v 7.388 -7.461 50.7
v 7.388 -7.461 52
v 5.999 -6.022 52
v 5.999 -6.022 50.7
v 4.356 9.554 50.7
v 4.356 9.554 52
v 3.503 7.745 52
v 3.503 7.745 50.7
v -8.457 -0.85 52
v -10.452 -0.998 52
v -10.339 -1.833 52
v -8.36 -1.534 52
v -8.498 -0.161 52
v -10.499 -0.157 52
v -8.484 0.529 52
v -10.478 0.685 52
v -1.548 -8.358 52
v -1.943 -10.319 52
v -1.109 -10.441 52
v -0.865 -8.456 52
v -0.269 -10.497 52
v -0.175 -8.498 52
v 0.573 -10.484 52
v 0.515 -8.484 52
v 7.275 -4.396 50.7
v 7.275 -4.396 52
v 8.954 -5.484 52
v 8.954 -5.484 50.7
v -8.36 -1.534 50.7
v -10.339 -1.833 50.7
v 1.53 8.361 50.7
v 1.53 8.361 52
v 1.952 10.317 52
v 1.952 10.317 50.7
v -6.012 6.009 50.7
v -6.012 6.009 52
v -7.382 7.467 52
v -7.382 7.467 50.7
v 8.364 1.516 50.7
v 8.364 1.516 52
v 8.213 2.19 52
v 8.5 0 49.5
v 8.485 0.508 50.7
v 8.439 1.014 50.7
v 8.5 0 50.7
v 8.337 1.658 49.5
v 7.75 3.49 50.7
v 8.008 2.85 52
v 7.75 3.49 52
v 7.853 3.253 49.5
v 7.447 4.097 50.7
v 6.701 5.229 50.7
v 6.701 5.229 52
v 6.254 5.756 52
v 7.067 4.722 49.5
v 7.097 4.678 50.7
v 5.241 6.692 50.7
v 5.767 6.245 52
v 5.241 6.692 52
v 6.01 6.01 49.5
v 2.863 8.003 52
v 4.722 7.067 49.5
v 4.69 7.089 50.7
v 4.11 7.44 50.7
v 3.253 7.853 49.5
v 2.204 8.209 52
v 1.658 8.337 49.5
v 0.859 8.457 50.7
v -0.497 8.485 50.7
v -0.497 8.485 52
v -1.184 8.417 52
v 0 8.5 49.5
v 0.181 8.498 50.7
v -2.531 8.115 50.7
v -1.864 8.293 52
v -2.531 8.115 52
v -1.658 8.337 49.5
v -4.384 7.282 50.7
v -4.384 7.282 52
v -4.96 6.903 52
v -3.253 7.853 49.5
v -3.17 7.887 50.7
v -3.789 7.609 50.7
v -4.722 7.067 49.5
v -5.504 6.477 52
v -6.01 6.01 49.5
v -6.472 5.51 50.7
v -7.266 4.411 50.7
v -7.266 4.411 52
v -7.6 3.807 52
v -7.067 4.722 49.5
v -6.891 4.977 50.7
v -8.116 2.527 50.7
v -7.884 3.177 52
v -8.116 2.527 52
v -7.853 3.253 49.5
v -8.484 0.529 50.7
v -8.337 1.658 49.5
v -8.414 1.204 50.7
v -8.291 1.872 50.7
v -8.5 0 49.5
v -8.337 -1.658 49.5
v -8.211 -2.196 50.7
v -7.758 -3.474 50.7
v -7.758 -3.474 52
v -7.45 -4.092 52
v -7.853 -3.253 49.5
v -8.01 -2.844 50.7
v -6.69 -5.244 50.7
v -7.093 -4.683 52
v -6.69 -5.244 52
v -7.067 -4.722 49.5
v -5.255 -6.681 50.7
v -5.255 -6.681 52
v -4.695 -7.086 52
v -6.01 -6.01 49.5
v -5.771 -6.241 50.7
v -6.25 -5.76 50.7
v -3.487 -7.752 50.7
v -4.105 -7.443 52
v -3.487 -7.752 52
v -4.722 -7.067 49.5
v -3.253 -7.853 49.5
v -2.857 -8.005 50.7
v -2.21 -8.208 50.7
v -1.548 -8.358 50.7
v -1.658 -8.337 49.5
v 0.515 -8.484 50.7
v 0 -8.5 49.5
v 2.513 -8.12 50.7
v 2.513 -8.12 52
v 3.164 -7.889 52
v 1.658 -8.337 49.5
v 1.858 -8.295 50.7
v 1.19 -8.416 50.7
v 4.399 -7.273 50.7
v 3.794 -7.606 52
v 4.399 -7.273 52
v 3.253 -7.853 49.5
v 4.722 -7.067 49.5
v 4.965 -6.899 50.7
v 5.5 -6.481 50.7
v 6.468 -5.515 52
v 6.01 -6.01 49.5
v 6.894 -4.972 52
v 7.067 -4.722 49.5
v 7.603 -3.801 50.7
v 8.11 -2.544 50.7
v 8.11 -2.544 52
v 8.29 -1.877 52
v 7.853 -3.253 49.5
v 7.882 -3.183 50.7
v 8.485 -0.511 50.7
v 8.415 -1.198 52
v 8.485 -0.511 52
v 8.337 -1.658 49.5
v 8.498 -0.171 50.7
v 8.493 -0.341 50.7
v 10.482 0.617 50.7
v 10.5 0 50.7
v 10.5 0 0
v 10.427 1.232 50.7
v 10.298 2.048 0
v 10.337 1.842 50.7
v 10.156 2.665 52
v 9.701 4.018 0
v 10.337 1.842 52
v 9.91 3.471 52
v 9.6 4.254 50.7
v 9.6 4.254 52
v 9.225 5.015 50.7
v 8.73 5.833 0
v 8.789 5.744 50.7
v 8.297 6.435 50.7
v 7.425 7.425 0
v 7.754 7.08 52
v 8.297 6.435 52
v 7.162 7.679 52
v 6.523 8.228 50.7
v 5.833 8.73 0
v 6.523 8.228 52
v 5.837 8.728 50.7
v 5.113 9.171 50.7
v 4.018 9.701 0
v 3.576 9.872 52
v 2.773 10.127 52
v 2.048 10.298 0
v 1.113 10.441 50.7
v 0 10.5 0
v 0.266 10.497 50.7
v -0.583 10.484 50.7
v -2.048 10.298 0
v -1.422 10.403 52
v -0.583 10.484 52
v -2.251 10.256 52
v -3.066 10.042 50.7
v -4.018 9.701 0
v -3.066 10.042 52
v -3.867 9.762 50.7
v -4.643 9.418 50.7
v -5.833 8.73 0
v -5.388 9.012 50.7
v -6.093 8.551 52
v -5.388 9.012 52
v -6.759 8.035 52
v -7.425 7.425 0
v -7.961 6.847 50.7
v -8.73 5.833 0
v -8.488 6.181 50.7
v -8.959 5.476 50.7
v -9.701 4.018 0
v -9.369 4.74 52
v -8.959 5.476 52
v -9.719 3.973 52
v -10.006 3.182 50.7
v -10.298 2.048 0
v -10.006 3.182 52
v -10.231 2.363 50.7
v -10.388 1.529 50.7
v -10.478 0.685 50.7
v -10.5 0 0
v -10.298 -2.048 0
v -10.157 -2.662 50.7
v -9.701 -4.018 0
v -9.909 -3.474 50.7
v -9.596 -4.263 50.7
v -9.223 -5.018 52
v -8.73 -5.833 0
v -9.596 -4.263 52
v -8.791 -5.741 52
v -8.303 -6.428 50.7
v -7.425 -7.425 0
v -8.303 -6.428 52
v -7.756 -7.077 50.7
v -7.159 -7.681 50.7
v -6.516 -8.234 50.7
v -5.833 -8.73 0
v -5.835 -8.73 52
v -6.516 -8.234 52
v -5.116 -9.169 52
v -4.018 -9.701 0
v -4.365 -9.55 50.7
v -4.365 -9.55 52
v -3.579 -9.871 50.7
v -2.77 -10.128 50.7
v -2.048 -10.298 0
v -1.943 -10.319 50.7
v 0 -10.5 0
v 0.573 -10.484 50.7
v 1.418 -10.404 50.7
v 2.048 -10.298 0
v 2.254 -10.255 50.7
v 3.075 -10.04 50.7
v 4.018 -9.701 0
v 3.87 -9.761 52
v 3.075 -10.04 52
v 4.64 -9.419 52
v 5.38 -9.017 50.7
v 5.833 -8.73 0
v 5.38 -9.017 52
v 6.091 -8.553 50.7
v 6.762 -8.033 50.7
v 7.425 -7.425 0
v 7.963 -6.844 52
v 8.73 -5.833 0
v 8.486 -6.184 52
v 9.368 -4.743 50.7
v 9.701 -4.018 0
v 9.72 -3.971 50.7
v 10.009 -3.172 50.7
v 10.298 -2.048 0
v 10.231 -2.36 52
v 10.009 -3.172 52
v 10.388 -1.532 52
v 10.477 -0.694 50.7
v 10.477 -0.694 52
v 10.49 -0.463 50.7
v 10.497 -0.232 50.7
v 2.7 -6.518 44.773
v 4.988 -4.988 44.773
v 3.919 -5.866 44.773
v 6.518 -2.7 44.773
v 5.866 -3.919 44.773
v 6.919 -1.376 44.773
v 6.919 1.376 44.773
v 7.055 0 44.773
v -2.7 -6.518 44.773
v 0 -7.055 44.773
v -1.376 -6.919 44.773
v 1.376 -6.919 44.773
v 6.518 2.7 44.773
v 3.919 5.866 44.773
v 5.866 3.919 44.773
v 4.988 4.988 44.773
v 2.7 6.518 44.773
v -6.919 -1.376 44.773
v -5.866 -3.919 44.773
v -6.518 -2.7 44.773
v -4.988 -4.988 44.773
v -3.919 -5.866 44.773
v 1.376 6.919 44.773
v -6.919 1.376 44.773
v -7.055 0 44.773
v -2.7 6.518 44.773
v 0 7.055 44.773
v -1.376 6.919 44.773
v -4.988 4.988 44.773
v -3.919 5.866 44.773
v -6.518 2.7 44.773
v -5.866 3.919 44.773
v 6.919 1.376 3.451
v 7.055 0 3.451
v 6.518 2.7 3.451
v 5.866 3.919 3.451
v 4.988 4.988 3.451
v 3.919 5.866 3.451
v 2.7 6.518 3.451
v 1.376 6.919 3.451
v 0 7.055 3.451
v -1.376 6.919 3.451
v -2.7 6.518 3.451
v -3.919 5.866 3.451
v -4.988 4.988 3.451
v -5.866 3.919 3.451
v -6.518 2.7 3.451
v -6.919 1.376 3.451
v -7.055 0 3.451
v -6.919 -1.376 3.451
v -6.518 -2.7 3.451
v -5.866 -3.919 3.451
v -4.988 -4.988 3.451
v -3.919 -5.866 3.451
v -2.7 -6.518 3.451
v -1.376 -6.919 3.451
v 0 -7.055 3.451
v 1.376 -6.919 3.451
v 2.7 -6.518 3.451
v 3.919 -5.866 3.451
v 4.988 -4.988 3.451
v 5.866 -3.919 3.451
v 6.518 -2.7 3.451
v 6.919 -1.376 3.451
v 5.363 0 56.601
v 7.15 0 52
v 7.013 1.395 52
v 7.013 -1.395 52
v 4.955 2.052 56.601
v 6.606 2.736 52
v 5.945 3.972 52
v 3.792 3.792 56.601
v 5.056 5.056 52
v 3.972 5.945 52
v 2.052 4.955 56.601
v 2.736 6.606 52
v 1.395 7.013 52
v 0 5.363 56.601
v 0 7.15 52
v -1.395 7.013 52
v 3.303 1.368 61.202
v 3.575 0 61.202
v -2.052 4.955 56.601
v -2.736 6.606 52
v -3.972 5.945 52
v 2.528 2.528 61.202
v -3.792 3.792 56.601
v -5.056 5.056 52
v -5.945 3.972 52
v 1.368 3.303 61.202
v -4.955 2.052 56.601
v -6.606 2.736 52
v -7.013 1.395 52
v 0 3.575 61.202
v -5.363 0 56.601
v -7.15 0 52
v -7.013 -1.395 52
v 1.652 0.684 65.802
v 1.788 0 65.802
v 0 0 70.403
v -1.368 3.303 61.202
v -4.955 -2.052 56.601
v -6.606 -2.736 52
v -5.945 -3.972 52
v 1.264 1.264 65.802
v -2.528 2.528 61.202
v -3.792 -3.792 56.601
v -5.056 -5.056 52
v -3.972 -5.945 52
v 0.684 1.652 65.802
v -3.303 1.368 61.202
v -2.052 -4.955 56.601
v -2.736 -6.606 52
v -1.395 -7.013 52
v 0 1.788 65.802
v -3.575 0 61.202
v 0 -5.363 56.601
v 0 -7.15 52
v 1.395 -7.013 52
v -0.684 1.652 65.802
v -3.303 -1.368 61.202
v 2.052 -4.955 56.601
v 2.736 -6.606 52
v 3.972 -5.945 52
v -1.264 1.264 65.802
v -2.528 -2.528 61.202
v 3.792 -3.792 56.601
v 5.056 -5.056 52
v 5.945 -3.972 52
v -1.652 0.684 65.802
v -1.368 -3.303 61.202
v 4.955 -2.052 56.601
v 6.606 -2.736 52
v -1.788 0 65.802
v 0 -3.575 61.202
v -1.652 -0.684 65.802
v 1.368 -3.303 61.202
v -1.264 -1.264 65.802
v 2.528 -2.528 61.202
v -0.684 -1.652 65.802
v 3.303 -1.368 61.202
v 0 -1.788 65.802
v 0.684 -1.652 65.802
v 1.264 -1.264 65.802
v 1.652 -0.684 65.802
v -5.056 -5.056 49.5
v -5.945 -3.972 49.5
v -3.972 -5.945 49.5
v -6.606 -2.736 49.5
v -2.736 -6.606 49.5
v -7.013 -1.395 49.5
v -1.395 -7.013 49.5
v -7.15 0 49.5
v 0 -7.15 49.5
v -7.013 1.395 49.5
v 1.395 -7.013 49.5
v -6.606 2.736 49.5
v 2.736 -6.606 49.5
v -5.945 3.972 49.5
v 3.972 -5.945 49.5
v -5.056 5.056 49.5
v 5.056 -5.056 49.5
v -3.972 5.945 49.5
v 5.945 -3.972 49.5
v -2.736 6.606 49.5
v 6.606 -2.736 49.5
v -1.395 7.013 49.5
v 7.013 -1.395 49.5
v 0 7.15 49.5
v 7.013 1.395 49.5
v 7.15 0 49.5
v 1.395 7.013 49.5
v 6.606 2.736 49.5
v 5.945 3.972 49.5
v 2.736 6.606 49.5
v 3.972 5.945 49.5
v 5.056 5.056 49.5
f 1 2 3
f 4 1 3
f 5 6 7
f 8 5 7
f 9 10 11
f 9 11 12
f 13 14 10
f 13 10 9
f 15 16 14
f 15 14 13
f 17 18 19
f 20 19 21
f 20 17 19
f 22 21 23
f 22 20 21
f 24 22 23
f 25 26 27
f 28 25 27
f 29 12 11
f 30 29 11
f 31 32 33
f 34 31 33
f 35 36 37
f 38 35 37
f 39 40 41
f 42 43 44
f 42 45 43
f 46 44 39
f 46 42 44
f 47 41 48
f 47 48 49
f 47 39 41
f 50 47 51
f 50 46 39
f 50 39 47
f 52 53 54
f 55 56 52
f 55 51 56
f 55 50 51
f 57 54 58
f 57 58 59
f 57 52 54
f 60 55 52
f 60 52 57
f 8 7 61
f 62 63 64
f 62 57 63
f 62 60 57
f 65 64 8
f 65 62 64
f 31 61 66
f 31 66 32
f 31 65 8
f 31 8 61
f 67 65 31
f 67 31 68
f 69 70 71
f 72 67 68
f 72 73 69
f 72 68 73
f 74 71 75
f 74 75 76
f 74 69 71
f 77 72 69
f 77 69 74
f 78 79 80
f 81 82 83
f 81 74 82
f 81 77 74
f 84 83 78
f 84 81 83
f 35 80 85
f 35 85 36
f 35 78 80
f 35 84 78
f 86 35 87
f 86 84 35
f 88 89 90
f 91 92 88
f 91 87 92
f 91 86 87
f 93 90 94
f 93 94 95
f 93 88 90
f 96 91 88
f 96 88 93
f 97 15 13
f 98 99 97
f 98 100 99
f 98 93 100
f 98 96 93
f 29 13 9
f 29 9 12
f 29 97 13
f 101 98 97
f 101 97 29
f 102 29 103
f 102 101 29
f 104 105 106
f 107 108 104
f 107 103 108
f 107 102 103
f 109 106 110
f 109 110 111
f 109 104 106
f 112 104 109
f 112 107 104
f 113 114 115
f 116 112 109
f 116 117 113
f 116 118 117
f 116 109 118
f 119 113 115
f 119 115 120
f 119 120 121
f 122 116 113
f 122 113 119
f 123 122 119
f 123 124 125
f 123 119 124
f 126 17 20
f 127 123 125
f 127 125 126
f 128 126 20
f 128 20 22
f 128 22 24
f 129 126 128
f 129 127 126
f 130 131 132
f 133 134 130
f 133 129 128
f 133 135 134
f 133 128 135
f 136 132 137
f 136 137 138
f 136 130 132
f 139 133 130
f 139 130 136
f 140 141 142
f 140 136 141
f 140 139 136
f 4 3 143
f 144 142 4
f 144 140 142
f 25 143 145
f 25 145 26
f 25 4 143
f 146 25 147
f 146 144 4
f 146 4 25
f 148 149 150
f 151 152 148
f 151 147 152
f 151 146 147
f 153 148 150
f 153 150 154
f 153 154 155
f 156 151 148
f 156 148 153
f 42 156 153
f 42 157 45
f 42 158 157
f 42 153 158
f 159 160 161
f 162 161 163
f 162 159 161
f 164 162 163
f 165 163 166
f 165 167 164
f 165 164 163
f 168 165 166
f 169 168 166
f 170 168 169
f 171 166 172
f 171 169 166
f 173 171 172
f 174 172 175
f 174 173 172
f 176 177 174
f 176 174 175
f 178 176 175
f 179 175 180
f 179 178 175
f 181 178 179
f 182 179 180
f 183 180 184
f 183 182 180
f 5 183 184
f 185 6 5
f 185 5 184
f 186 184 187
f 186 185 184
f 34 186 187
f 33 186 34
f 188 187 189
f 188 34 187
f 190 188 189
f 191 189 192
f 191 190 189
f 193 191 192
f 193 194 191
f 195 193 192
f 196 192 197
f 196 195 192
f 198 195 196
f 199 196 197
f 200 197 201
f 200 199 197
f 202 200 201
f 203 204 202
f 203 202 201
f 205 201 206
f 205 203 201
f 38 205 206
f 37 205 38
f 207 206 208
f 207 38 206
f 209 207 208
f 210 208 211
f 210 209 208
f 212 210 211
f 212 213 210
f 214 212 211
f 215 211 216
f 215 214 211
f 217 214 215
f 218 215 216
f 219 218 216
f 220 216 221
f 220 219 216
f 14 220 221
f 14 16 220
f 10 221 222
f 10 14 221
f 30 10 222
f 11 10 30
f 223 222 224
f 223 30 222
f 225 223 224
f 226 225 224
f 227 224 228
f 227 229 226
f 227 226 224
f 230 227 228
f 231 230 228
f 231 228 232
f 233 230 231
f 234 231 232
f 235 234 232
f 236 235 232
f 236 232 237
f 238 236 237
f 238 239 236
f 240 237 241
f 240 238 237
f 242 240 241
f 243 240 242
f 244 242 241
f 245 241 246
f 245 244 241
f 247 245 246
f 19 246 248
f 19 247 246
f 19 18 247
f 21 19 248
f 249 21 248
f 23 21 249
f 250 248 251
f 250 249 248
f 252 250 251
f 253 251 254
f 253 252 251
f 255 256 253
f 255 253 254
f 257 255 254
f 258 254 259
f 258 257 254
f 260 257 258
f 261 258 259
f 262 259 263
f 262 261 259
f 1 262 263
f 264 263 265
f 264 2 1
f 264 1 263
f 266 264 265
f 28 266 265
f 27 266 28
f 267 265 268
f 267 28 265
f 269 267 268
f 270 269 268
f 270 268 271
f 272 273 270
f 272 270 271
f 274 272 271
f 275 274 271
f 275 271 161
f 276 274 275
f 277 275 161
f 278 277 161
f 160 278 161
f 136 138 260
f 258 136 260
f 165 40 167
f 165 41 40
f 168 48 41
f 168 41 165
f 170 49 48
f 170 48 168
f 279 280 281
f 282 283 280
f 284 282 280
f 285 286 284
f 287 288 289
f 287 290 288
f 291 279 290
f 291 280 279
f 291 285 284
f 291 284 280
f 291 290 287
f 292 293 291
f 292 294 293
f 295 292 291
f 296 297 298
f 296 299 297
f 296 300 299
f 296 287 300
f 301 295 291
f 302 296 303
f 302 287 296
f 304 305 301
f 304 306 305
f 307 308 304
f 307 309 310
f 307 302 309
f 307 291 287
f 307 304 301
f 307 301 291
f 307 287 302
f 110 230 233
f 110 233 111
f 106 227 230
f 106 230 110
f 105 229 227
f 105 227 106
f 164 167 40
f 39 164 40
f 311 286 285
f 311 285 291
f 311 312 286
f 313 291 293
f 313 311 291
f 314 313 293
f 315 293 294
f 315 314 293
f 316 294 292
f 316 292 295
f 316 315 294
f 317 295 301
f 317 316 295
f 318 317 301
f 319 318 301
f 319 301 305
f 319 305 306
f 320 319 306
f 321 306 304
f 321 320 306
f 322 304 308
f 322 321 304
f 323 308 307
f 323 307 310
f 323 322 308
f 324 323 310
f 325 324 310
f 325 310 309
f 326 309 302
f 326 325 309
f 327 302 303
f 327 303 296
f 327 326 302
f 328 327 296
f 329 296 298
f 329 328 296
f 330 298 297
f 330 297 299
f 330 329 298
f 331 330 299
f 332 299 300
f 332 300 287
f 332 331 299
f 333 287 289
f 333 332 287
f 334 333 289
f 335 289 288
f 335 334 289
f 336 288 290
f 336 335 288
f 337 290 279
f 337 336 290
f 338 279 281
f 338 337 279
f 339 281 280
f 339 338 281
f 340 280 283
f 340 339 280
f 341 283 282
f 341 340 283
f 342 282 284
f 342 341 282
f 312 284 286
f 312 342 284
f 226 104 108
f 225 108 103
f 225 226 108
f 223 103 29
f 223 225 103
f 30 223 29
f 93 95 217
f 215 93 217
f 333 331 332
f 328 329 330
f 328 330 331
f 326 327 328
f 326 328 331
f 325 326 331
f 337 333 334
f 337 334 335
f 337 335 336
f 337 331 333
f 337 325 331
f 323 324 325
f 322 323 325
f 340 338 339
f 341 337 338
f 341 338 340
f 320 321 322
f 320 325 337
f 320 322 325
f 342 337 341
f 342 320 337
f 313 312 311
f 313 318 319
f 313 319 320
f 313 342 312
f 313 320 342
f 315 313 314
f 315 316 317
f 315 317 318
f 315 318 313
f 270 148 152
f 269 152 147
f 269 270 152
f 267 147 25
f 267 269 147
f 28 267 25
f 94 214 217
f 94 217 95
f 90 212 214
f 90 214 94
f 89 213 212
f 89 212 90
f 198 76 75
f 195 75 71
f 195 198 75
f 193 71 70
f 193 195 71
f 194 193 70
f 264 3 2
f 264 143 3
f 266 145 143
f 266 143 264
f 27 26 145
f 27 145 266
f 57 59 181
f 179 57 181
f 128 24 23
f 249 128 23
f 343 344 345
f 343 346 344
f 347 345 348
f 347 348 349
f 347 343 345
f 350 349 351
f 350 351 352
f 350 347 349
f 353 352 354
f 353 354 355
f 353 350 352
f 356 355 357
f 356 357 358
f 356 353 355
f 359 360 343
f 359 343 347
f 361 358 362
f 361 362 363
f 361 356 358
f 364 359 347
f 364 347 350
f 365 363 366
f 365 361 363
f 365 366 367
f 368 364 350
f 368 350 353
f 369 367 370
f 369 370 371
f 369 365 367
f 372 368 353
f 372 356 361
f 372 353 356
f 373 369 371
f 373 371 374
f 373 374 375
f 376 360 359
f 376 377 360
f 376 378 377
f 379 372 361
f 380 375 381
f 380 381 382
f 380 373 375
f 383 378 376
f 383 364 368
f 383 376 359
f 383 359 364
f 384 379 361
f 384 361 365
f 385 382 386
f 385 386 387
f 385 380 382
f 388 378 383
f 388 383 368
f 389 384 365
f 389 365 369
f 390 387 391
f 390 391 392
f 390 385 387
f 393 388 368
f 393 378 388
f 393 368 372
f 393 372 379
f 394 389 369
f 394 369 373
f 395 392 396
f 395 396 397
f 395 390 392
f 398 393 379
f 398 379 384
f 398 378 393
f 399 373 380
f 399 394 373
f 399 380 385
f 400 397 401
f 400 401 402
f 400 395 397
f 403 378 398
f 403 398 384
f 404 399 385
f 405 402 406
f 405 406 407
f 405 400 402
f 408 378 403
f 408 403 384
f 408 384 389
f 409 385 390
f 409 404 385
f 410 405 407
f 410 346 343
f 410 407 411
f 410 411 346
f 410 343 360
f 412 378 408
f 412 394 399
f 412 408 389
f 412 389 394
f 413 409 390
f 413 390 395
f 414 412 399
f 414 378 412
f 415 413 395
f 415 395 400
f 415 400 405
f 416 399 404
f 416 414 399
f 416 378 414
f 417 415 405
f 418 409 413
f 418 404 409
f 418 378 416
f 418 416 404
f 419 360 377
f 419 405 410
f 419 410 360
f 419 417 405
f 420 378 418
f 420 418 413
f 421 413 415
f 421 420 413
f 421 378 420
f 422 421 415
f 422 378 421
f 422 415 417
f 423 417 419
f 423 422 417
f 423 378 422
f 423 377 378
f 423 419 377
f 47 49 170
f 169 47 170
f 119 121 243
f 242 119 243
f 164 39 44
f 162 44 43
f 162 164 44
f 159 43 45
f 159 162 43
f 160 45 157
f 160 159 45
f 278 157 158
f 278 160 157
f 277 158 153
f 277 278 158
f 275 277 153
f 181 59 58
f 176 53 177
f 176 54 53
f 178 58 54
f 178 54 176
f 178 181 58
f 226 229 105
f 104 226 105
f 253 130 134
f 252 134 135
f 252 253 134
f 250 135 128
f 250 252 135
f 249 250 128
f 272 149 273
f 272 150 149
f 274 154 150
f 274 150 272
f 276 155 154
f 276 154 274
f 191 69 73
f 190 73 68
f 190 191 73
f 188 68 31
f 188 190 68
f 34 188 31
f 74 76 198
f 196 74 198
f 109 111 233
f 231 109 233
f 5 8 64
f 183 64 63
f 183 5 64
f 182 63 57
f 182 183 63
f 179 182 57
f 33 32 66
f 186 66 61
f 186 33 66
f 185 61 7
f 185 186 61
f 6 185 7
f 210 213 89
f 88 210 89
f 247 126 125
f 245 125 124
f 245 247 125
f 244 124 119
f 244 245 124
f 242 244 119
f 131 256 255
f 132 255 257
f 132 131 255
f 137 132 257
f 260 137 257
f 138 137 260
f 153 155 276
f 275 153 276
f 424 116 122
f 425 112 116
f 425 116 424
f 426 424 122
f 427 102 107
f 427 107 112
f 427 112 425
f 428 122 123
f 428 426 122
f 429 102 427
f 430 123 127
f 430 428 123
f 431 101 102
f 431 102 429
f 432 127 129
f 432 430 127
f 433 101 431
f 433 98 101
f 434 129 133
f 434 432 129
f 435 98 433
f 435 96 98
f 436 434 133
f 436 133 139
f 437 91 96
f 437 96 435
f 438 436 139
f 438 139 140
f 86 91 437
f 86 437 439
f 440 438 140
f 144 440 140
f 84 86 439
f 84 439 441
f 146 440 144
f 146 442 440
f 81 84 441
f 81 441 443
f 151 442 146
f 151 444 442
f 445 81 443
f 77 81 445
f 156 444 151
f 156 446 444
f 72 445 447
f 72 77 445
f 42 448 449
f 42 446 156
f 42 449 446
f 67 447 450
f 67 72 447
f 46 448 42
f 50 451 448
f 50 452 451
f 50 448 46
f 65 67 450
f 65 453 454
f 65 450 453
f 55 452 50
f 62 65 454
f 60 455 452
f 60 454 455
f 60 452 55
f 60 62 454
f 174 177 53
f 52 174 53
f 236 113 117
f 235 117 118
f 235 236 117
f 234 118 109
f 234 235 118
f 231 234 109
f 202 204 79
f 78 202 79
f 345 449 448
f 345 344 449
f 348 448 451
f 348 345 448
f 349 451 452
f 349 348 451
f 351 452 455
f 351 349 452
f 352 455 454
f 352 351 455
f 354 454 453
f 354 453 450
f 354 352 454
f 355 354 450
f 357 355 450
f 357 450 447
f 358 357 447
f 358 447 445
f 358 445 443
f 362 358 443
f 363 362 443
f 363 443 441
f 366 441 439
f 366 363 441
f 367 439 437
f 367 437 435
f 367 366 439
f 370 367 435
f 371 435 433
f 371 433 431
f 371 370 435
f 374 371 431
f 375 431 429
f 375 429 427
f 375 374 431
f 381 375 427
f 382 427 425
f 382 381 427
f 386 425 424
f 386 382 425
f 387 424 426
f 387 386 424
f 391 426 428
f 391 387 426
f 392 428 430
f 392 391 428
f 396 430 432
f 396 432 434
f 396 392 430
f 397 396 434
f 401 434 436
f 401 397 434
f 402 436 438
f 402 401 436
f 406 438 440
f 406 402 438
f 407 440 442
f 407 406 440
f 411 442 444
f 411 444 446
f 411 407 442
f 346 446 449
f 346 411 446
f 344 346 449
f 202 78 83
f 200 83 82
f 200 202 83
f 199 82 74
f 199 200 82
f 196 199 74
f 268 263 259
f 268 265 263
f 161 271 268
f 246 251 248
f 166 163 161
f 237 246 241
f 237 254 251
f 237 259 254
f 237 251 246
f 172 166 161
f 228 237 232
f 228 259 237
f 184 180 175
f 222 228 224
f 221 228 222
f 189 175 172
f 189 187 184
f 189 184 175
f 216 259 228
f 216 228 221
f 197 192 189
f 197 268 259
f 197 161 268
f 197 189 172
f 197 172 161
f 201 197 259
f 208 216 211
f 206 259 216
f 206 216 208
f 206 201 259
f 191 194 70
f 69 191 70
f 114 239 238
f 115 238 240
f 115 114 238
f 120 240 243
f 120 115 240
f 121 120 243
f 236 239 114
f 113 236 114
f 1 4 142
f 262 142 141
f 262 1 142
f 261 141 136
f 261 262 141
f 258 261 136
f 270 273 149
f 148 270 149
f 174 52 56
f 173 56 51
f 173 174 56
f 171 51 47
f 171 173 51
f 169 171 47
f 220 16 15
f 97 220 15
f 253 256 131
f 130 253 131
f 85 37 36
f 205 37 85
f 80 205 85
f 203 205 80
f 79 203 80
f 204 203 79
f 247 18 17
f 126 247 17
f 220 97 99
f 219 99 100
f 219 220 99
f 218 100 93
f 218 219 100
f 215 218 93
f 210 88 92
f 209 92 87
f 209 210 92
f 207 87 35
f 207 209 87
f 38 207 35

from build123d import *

# Parameters (mm, degrees)
F3_DEPTH        = 1.3
F3_COPIES_COUNT = 13


# Not quite as in the source:
# - a pattern or mirror of a feature is missing from the dataset's text; its kind, count and spacing are read off the source's solid


with BuildPart() as f1:
    # F0 (on Front) → F1 (revolve)
    with BuildSketch(Plane.XZ):
        Polygon((0, 3.4508320969), (0, 0), (10.5, 0), (10.5, 52), (8.5, 52), (8.5, 49.5), (7.1502993815, 49.5), (7.1502993815, 52), (0, 70.4032331705), (0, 44.7733812034), (7.0547335781, 44.7733812034), (7.0547335781, 3.4508320969), align=None)
    revolve(axis=Axis((0, 0, 35.2016165853), (0, 0, 1)))

    # F2 (on face) → F3 (cut)
    with BuildSketch(Plane.XY.offset(52)):
        with BuildLine():
            ThreePointArc((6.5231491988, 8.2279113103), (5.4797365468, 8.9567006971), (4.3558130739, 9.5538940995))
            Line((4.3558130739, 9.5538940995), (3.5032103316, 7.7445153091))
            ThreePointArc((3.5032103316, 7.7445153091), (4.4034584873, 7.2704575751), (5.2406151405, 6.6922307902))
            Line((5.2406151405, 6.6922307902), (6.5231491988, 8.2279113103))
        make_face()
    f3 = extrude(amount=-F3_DEPTH, mode=Mode.SUBTRACT)

    # F3_copies: F3 ×13 about axis
    f3_copies_axis = Axis((0, 0, 0), (0, 0, 1))
    for i in range(1, F3_COPIES_COUNT):
        add(f3.rotate(f3_copies_axis, i * 360 / F3_COPIES_COUNT), mode=Mode.SUBTRACT)


solid = f1.part
